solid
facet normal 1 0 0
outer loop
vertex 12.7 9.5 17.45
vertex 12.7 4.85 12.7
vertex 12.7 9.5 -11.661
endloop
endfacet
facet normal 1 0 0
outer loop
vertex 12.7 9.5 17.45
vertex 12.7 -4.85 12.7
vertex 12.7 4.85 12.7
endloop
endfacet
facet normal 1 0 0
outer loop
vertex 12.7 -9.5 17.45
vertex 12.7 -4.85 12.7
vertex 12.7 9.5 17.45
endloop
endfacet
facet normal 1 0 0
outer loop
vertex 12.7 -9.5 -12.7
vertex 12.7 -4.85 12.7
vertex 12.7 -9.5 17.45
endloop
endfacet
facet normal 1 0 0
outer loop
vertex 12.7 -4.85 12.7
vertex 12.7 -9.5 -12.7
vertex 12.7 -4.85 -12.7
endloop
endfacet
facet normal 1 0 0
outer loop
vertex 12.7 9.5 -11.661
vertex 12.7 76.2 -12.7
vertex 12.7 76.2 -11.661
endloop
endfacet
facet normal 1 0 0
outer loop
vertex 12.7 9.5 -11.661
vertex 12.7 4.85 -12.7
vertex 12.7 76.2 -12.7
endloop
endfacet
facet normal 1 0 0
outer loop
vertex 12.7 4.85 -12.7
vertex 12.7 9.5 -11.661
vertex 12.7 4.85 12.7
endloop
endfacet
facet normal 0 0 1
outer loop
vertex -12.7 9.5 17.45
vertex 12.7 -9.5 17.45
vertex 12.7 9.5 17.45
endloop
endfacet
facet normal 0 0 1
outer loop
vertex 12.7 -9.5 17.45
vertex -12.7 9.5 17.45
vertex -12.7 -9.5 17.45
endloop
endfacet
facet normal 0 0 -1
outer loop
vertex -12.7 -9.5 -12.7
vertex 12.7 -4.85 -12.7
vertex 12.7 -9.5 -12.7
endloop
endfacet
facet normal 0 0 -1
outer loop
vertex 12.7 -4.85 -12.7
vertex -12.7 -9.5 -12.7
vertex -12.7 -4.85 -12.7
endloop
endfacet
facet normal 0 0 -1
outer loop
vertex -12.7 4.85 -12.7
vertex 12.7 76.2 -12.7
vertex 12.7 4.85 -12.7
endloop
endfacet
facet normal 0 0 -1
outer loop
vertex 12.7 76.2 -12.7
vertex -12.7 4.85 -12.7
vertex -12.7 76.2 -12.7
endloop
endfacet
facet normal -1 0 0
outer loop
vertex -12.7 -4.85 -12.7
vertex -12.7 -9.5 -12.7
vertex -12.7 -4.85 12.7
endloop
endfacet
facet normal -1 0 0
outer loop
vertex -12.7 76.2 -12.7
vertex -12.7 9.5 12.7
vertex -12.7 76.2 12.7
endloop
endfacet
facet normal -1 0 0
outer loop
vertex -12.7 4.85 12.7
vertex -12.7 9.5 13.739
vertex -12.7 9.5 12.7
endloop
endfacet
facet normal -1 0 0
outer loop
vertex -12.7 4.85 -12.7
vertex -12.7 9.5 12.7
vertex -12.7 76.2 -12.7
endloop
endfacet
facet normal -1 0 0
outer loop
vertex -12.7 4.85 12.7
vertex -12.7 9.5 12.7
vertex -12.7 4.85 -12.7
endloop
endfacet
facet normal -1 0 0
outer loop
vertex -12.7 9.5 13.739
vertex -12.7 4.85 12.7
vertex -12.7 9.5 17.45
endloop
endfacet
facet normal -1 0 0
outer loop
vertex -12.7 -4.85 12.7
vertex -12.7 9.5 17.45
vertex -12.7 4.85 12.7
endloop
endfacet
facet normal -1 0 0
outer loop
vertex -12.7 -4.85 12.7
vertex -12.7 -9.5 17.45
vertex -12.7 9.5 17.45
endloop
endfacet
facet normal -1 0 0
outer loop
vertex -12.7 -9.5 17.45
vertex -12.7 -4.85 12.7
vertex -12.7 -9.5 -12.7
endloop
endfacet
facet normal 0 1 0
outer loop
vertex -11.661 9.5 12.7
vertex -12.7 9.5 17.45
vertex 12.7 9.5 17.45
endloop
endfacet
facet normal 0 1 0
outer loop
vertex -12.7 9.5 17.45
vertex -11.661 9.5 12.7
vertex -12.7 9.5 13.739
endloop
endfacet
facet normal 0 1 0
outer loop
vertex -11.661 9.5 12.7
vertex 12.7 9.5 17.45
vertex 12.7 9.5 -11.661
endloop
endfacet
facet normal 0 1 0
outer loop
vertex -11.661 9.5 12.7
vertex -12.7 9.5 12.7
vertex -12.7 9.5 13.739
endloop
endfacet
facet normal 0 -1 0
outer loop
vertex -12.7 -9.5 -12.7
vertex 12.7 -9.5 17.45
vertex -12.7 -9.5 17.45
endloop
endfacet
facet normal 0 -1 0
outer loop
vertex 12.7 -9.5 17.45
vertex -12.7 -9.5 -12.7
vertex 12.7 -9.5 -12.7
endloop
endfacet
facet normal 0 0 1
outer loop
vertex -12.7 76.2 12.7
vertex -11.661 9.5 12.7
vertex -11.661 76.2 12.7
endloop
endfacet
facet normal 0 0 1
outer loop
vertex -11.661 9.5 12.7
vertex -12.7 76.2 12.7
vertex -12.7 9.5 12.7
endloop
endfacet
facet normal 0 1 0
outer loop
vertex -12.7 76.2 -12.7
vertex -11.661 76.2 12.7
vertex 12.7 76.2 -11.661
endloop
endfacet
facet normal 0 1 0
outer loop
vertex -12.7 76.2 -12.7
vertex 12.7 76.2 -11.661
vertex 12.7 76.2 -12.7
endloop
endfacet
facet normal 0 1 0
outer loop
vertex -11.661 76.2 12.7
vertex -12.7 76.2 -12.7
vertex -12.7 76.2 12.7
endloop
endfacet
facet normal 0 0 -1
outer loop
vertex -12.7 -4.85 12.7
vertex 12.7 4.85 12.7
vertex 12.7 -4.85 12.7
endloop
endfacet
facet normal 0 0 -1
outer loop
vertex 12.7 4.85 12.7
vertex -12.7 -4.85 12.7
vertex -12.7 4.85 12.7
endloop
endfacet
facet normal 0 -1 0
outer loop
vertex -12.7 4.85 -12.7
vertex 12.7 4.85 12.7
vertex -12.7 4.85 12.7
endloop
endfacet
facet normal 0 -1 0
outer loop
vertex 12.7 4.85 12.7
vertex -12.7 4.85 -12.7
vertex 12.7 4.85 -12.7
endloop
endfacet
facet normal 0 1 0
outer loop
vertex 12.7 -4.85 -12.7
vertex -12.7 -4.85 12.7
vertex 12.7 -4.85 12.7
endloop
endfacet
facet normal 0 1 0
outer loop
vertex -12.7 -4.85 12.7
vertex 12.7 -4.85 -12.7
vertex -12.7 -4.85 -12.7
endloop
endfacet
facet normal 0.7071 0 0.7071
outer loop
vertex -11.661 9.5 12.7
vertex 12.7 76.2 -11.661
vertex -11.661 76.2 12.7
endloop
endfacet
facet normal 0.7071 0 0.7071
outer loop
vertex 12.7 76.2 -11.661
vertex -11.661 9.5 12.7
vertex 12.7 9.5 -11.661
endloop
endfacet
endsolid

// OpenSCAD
difference () {
	union () {
		translate([0, 0, 9.5/4]) cube([25.4, 9.5 * 2, 25.4 + (9.5 / 2)], center = true);
		translate([0, (25.4 * 3) / 2, 0]) cube([25.4, 25.4 * 3, 25.4], center = true);
	}
	cube([25.4, 9.7, 25.4], center = true);
	translate([5, 9.5 + (25.4 * 3) / 2, 14]) rotate([0, 45, 0]) cube([25.4 * 2, 25.4 * 3, 25.4], center = true);
}
